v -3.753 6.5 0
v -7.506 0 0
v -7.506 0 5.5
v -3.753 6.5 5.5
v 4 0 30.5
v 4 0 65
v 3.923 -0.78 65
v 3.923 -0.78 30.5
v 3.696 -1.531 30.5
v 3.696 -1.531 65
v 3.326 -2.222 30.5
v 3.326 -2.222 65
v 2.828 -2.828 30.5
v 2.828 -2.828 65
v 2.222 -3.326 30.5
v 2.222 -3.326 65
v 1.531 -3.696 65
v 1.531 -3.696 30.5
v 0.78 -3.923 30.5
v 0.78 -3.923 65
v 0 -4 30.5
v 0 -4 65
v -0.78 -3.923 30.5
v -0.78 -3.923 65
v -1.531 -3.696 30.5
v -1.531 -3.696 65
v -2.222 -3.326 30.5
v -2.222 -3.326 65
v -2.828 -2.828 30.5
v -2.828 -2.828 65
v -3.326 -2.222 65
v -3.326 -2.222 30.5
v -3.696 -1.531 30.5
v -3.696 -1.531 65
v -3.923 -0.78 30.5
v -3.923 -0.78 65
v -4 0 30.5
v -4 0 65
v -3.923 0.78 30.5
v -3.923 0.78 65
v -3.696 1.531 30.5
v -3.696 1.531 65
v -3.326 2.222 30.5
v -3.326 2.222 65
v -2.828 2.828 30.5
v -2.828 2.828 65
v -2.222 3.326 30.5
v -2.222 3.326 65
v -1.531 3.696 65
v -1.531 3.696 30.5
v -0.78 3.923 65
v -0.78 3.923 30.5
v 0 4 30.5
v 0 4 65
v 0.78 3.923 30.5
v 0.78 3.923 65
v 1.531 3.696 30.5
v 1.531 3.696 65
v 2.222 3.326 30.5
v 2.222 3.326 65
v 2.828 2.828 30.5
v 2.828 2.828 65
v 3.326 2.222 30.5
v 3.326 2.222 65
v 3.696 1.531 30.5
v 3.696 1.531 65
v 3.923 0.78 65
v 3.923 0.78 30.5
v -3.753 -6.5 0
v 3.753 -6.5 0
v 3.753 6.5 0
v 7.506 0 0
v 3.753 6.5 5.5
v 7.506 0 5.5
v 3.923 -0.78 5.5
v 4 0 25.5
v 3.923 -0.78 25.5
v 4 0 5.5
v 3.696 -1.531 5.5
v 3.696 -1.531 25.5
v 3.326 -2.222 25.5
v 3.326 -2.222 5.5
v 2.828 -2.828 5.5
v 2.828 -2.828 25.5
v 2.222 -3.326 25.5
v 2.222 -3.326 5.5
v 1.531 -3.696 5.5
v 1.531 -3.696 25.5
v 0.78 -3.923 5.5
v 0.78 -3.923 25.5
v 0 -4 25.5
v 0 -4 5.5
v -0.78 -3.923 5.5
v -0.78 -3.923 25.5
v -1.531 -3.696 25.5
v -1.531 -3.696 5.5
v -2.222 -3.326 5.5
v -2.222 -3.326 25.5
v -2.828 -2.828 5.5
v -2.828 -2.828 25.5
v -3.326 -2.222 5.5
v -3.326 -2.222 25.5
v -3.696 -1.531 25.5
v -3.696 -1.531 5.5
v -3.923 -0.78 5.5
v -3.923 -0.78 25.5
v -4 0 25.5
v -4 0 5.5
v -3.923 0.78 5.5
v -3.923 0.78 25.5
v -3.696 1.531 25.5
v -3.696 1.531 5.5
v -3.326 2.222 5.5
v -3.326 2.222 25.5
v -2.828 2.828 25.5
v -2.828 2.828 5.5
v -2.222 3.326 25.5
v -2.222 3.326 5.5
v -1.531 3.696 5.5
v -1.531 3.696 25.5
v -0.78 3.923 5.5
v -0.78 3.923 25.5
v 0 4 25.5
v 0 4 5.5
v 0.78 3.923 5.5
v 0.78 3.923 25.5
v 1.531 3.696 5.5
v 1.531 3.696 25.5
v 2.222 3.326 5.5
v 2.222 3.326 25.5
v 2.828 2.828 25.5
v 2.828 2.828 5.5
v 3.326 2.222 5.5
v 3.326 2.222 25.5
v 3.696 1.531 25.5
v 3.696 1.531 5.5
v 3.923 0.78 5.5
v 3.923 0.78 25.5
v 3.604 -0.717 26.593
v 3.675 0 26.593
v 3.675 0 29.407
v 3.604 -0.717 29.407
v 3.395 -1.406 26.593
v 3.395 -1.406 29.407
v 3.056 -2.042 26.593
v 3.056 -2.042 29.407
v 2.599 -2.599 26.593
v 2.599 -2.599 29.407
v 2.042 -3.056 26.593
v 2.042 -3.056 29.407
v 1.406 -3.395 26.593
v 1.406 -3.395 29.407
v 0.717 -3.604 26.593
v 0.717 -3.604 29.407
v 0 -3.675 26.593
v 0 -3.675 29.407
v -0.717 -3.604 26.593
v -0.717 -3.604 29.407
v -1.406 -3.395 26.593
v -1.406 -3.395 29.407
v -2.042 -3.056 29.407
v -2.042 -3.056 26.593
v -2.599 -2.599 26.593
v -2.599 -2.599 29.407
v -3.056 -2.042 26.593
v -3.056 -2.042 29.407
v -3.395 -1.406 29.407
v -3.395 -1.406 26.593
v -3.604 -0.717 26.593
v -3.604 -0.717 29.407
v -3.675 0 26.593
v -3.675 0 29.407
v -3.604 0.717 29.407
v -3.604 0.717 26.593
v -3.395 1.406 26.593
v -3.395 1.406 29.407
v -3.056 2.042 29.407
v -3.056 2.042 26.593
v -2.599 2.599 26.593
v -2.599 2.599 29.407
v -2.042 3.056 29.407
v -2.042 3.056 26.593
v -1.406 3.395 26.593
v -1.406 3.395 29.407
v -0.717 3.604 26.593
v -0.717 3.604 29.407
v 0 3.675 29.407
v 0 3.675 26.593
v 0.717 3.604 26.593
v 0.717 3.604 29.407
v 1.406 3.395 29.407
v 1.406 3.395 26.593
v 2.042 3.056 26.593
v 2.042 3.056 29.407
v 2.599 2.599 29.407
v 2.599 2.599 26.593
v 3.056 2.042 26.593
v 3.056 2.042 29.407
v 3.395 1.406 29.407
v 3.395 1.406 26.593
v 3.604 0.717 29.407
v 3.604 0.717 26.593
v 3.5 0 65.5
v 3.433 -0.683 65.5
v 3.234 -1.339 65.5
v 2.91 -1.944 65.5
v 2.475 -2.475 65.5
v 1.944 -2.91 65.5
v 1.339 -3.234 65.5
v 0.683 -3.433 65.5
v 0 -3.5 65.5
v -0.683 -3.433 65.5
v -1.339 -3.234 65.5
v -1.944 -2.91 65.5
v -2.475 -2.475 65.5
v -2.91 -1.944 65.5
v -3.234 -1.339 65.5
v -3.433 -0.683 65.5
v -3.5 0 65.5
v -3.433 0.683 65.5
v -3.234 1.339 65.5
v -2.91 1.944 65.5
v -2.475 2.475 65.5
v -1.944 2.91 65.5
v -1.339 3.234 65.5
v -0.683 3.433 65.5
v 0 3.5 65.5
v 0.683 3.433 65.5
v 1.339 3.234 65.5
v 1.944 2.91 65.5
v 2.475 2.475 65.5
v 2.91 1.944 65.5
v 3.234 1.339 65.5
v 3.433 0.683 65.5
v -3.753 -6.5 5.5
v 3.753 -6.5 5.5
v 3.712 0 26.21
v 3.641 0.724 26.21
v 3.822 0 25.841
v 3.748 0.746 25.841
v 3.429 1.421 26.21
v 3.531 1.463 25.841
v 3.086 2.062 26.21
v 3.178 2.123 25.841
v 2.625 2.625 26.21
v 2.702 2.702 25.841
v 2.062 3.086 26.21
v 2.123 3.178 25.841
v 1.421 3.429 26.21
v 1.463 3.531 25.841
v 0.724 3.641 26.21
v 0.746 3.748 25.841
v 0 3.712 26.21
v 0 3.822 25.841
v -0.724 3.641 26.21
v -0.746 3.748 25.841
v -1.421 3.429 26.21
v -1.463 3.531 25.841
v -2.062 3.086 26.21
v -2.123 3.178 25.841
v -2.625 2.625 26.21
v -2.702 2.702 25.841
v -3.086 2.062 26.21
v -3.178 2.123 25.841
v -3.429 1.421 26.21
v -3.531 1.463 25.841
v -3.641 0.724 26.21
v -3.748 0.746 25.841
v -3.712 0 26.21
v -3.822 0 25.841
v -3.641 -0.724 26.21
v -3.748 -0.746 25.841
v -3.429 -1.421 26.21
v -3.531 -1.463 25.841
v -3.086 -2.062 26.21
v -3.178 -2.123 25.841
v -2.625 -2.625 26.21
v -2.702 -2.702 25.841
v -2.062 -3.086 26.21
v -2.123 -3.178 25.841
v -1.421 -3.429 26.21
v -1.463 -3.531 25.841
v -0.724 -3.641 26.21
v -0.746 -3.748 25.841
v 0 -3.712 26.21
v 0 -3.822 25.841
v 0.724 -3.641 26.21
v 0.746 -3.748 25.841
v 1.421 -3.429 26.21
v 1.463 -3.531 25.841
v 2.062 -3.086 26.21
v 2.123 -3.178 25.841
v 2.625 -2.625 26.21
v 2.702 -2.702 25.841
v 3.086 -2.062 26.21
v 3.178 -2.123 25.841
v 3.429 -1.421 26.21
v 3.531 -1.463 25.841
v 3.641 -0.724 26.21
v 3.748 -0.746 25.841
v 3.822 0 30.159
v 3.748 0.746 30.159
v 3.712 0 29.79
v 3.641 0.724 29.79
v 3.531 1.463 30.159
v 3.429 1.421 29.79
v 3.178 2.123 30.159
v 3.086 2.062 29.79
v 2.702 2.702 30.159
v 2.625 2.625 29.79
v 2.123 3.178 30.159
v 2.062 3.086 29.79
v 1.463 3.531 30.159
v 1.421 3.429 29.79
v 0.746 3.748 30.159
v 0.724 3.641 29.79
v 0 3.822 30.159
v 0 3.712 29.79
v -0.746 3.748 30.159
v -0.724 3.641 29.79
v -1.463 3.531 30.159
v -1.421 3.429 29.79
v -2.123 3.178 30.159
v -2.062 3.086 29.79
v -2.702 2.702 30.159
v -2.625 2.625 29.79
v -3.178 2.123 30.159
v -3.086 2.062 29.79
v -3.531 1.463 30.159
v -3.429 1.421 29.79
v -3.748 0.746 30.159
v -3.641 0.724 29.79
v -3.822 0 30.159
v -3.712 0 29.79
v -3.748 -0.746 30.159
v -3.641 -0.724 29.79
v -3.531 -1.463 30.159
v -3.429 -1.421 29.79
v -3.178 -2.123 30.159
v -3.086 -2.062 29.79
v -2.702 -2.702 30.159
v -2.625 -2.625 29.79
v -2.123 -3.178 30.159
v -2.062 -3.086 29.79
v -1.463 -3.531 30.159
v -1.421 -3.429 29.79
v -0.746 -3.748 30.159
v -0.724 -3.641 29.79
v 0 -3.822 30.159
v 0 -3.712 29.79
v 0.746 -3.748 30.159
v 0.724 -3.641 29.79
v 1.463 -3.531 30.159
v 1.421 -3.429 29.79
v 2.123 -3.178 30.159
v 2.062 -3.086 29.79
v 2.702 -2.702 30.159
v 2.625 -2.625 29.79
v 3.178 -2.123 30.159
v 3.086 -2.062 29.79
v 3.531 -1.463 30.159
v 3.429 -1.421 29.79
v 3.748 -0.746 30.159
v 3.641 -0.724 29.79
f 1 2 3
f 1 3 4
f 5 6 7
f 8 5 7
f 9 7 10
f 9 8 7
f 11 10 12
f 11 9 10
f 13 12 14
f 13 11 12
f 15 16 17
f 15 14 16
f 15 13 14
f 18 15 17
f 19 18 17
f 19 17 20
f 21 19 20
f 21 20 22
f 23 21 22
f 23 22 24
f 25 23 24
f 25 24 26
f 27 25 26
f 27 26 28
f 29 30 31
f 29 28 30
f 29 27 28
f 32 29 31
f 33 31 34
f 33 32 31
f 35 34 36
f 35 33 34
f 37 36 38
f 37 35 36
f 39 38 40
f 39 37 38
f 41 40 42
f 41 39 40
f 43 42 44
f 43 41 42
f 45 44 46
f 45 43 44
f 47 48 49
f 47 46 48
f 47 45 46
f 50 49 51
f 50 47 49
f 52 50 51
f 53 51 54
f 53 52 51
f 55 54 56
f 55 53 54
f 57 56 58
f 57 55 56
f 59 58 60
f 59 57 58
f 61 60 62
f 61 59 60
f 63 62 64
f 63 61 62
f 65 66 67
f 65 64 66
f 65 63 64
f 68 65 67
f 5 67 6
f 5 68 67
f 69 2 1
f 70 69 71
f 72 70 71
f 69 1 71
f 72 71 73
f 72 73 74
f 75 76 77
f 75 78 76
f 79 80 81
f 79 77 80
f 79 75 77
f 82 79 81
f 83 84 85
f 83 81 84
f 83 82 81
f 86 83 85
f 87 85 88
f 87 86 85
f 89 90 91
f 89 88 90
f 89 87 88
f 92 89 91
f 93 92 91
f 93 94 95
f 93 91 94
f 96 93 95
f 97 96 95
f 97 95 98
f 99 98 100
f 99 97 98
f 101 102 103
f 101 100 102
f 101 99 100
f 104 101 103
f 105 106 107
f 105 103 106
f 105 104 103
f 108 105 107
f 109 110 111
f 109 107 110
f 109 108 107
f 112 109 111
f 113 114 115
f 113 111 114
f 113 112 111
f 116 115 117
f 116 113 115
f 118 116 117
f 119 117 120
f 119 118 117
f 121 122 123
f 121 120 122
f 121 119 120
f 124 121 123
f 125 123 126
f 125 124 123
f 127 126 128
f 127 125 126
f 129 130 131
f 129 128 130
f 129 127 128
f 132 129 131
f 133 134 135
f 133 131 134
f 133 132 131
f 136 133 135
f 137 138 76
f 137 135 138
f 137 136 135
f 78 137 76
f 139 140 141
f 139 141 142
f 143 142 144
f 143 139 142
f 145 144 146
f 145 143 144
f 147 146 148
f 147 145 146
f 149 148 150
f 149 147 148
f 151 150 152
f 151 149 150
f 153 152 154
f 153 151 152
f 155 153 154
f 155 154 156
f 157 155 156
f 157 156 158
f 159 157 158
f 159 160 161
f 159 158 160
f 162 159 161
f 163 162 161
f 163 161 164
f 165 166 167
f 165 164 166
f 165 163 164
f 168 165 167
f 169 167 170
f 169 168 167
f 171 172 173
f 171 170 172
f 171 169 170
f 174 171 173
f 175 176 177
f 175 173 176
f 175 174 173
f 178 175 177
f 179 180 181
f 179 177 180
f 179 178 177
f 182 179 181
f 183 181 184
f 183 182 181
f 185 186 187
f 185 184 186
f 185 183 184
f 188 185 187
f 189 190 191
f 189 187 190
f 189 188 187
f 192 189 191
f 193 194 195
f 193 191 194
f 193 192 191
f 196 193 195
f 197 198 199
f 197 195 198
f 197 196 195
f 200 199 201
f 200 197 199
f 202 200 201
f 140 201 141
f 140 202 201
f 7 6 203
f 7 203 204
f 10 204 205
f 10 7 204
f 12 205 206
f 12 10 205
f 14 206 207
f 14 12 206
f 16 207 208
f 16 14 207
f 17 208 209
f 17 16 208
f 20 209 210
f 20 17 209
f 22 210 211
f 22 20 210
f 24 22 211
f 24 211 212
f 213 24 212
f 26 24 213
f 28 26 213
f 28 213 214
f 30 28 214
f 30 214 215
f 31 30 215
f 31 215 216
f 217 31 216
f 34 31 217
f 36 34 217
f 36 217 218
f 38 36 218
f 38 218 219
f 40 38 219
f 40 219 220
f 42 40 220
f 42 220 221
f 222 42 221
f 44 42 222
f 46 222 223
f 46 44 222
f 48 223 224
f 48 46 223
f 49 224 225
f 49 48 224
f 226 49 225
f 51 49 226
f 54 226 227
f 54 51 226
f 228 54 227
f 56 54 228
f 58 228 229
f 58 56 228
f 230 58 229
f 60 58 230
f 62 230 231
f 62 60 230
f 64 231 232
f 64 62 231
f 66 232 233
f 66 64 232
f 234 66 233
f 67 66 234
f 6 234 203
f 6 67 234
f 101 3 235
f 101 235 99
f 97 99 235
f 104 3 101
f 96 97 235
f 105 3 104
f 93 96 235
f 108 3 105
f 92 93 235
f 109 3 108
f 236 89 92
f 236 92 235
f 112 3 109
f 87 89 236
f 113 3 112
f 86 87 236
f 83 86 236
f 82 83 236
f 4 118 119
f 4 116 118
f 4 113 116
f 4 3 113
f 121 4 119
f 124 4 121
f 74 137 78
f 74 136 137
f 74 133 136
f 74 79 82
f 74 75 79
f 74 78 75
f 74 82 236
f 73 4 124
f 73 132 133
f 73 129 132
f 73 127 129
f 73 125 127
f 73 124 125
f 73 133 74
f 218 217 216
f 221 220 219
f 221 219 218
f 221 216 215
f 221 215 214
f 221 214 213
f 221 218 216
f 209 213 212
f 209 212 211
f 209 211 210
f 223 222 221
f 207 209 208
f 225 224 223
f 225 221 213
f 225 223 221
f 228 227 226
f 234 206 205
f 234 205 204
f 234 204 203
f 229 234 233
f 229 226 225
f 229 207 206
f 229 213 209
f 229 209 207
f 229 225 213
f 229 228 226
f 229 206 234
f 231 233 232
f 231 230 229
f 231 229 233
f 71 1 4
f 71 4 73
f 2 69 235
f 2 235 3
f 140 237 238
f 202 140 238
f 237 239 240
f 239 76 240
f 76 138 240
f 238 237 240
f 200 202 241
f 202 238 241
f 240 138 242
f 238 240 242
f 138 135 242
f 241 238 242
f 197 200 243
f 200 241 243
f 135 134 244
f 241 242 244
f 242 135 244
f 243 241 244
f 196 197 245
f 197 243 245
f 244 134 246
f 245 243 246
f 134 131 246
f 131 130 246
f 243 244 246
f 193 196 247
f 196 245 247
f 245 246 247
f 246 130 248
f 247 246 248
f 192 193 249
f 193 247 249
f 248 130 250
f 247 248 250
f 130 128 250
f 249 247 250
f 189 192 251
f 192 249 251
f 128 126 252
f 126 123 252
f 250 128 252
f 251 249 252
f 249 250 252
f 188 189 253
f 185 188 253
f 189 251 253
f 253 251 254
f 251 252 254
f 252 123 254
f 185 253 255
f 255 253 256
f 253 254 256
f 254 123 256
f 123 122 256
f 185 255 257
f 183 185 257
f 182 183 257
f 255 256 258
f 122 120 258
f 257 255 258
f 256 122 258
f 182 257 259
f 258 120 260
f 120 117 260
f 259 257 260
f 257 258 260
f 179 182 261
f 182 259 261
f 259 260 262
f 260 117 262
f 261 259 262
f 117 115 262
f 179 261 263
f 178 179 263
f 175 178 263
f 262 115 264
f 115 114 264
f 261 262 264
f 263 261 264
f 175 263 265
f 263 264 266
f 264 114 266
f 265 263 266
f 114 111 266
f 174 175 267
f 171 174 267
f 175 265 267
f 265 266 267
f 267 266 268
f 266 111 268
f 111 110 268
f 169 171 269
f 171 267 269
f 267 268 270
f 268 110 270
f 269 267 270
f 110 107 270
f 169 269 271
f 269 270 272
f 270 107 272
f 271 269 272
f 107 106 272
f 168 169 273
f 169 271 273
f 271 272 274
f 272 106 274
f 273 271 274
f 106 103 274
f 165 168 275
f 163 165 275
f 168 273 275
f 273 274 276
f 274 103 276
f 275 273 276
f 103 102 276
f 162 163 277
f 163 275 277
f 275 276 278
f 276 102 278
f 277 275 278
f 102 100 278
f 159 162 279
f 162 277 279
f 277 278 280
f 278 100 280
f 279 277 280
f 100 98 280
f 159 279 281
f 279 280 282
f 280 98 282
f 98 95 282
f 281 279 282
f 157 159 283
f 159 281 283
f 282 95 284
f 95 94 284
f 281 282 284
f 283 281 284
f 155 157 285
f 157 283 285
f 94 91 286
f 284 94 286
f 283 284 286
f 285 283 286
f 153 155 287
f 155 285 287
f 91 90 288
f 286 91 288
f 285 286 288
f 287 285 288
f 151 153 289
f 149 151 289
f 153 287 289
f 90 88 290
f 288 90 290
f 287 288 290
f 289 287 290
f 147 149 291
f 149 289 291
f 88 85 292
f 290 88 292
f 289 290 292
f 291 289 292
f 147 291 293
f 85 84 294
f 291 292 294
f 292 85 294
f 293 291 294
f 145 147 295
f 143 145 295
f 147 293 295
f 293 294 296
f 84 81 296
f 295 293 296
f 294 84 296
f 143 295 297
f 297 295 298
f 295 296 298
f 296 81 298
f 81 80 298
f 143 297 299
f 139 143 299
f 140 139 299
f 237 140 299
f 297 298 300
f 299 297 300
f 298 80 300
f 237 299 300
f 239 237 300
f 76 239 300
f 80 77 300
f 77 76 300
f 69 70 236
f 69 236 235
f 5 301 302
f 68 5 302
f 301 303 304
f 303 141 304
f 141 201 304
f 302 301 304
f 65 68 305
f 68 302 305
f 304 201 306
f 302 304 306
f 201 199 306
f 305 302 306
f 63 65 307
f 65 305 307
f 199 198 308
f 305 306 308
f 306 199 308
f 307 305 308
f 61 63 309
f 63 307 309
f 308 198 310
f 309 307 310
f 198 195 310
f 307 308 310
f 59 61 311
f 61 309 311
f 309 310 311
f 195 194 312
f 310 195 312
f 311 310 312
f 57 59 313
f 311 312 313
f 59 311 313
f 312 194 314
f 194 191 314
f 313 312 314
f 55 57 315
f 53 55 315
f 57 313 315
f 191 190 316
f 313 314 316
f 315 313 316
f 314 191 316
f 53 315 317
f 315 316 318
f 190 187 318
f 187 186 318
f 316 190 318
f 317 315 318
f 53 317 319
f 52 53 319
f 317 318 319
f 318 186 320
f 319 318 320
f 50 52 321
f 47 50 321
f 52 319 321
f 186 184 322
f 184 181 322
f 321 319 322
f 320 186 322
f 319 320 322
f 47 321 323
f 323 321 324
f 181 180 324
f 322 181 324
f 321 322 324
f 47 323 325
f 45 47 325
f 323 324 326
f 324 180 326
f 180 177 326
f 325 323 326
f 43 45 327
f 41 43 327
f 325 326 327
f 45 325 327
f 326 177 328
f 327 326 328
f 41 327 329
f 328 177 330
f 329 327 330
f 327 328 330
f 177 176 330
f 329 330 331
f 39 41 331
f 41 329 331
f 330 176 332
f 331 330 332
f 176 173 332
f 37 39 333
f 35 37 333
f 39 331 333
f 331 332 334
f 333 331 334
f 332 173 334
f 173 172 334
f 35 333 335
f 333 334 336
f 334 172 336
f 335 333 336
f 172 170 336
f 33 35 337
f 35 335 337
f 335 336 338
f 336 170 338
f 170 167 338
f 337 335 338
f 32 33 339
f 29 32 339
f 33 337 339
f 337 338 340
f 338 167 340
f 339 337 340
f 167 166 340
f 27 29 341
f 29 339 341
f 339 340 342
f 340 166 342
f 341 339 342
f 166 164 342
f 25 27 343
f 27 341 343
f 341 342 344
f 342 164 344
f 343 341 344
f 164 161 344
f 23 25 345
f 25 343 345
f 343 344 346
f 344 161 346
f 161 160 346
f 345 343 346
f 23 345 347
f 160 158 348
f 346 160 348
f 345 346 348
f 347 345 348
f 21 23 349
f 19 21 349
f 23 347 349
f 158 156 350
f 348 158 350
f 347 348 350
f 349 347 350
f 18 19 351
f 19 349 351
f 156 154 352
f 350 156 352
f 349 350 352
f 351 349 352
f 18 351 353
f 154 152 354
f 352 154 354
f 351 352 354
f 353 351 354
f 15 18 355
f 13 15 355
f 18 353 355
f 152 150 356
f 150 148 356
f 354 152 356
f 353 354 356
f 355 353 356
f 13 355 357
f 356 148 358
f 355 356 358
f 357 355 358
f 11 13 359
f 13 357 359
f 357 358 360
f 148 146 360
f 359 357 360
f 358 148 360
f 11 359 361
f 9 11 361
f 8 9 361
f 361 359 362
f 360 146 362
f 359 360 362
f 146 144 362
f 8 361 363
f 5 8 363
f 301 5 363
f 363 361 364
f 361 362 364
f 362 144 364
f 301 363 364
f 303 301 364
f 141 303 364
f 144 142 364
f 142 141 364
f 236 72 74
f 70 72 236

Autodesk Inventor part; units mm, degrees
ref_plane "YZ Plane" through (0, 0, 0) normal (1, 0, 0) x (0, 1, 0)
ref_plane "XZ Plane" through (0, 0, 0) normal (0, 1, 0) x (-1, 0, 0)
ref_plane "XY Plane" through (0, 0, 0) normal (0, 0, 1) x (1, 0, 0)
sketch "Szkic1" plane through (0, 0, 0) normal (0, 0, 1) x (1, 0, 0)
  line L0 (3.7528, 6.5) -> (7.5056, 0)
  line L1 (7.5056, 0) -> (3.7528, -6.5)
  line L2 (3.7528, -6.5) -> (-3.7528, -6.5)
  line L3 (-3.7528, -6.5) -> (-7.5056, 0)
  line L4 (-7.5056, 0) -> (-3.7528, 6.5)
  line L5 (-3.7528, 6.5) -> (3.7528, 6.5)
  point P0 (0, 0)
  point P1 (0, 0)
  point P2 (0, 6.5)
extrude "Wyciągnięcie proste1" add sketch "Szkic1" along normal blind 5.5
sketch "Szkic2" plane through (0, 0, 5.5) normal (0, 0, 1) x (1, 0, 0)
  circle A0 centre (0, 0) radius 4
  dimension "d3" = 8
extrude "Wyciągnięcie proste2" add sketch "Szkic2" along normal blind 20
sketch "Szkic3" plane through (0, 0, 25.5) normal (0, 0, 1) x (1, 0, 0)
  circle A0 centre (0, 0) radius 4 projected
  circle A1 centre (0, 0) radius 3.675
  dimension "d6" = 7.35
extrude "Wyciągnięcie proste3" add sketch "Szkic3" along normal blind 5 contours A1
sketch "Szkic4" plane through (0, 0, 30.5) normal (0, 0, 1) x (1, 0, 0)
  circle A0 centre (0, 0) radius 4 projected
extrude "Wyciągnięcie proste4" add sketch "Szkic4" along normal blind 35
thread "Gwint1" size "M8x1.25" class "6g" standard "ANSI Metric M Profile" length 25 offset 10
fillet "Zaokrąglenie1" radius 2 2 edges at (-3.675, 0, 25.5) (-3.675, 0, 30.5)
chamfer "Faza1" distance 0.5 angle 45 1 edges at (-4, 0, 65.5)
properties part number "COTS_GENERIC_M8_Hobbed_Bolt"
